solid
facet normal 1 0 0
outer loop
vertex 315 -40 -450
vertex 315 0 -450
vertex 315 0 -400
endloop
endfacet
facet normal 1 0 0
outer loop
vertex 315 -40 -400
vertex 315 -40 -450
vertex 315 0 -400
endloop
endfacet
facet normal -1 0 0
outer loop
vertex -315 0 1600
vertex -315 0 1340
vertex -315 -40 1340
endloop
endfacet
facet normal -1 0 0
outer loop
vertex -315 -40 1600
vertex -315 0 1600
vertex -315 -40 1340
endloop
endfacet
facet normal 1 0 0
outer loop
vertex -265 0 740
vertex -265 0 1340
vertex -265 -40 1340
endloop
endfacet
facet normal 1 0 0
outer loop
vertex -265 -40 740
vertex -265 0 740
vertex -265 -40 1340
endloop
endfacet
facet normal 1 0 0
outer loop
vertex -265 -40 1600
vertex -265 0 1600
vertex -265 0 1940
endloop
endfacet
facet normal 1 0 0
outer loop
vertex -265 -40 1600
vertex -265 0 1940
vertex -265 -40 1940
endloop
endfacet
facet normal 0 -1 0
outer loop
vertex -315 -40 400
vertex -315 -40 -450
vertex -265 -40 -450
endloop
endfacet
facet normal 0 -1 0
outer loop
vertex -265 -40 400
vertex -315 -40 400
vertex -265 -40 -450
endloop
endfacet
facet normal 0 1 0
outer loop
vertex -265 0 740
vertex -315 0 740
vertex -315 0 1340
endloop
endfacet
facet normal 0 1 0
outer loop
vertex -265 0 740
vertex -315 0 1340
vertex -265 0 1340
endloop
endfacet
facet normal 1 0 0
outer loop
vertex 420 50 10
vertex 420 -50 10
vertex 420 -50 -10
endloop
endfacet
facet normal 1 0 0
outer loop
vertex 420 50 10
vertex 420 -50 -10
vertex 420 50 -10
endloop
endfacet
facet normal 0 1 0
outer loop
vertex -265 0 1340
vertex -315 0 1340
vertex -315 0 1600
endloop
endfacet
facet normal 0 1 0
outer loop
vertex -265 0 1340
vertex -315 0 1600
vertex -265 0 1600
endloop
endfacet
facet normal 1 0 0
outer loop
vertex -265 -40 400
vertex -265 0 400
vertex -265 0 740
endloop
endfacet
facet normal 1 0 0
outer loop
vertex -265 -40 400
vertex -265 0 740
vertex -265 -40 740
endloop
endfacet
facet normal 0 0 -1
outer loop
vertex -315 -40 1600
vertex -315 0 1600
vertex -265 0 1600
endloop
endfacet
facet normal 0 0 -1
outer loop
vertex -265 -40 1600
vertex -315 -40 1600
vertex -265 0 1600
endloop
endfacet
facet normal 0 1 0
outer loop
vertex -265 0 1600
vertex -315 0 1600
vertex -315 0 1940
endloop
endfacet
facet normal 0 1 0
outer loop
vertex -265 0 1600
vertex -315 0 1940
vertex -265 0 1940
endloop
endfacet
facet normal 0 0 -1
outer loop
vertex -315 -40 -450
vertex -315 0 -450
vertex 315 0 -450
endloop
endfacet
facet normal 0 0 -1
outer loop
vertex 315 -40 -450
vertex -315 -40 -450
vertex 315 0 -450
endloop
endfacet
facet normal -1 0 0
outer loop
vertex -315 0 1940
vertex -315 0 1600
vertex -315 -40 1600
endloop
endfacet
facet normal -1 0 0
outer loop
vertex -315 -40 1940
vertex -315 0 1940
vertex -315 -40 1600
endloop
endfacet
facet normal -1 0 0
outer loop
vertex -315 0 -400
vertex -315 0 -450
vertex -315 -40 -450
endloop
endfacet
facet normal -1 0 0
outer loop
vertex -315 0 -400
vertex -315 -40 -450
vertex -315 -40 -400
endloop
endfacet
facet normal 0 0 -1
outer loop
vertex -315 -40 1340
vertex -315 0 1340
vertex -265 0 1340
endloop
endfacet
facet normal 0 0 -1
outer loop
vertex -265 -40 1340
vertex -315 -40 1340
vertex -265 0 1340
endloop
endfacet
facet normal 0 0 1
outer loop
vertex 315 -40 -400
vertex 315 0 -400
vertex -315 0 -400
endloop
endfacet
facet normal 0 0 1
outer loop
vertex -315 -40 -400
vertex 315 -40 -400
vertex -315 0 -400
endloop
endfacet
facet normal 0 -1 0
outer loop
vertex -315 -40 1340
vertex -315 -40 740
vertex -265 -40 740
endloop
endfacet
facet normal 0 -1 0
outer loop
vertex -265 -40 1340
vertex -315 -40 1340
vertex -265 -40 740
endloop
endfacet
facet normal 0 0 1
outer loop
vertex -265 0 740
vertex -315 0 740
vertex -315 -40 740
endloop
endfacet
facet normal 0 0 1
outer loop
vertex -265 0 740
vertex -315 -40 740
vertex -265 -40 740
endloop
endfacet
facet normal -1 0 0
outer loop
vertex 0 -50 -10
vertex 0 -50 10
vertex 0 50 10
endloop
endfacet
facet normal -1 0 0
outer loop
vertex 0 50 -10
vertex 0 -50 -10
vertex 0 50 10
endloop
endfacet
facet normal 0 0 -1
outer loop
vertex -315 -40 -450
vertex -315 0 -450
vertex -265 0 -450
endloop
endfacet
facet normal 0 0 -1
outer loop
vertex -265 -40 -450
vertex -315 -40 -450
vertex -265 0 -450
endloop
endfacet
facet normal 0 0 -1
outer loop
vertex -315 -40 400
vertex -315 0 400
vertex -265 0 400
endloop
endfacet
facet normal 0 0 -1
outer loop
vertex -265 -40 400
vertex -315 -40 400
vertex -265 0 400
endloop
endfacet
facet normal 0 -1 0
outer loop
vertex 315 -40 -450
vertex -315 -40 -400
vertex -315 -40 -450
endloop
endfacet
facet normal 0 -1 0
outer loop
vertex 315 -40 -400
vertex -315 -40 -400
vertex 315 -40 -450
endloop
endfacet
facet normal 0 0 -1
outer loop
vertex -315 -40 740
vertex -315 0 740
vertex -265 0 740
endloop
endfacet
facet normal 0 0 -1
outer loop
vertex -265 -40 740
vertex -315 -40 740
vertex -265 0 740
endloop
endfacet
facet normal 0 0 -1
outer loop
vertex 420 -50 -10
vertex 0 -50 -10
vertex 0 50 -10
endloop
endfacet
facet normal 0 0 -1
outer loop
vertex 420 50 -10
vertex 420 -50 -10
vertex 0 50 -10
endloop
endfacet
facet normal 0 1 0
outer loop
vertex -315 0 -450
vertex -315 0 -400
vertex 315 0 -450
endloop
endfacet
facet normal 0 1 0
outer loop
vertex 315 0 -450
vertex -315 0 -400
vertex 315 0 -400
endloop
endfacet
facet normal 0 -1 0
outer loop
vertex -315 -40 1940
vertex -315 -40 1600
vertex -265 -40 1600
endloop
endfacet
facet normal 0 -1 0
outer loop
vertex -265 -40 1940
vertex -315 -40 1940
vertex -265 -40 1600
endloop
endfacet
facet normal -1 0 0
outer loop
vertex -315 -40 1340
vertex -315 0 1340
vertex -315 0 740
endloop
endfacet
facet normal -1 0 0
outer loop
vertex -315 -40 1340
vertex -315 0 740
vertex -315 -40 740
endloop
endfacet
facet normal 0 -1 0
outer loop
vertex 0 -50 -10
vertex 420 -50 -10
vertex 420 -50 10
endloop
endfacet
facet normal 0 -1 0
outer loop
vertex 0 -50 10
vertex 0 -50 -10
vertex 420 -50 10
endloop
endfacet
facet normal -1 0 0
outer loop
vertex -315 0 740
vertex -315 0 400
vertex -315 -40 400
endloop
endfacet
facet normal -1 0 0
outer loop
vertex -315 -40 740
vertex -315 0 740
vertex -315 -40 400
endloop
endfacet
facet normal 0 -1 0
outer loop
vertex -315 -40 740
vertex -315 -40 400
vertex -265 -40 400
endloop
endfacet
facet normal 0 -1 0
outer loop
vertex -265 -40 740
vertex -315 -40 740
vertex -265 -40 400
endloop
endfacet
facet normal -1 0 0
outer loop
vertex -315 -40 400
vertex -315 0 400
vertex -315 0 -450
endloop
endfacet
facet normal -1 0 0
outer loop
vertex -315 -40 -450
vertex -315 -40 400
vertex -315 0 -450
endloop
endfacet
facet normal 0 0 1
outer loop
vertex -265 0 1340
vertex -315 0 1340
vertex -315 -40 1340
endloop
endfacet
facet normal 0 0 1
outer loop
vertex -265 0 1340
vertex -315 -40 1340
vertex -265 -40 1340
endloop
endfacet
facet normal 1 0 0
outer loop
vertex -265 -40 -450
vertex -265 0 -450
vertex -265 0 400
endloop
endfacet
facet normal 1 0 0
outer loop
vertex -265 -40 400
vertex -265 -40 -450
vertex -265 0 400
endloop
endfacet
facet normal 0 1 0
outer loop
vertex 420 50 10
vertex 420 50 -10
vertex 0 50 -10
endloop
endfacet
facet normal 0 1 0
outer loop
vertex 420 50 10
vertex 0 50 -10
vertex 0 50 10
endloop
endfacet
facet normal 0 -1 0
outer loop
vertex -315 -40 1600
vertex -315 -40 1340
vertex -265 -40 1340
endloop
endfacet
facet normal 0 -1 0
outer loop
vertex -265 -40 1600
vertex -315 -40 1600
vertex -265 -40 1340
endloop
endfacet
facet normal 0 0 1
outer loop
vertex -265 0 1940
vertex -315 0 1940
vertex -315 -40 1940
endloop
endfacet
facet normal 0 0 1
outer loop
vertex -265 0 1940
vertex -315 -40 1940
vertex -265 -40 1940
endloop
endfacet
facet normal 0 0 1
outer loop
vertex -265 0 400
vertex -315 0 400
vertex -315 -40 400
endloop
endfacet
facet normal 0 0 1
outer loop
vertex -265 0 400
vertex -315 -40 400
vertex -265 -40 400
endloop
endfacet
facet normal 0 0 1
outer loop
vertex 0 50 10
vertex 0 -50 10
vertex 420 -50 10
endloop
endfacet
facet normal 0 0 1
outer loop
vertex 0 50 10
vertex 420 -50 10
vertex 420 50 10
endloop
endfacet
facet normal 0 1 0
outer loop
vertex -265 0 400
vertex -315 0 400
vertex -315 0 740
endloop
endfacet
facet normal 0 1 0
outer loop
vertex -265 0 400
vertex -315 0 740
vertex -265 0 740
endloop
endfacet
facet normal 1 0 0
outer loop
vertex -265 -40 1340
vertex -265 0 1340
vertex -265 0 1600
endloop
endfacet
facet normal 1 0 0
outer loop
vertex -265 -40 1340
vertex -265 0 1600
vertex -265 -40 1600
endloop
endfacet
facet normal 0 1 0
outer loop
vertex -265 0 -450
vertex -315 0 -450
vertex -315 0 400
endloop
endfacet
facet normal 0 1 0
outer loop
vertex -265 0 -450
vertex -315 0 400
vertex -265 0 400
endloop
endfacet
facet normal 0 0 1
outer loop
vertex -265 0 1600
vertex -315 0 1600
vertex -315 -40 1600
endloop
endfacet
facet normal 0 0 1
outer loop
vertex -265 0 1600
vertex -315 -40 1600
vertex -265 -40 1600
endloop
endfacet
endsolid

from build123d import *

# Parameters (mm, degrees)
F0_W     = 50
F0_H     = 800
F0_H_2   = 50
F1_DEPTH = 40
F2_DEPTH = 40
F3_DEPTH = 340
F4_DEPTH = 600
F5_DEPTH = 260
F6_DEPTH = 340
F7_W     = 100
F7_H     = 20
F8_DEPTH = 420


with BuildPart() as f1:
    # F0 (on Front) → F1 (new body)
    with BuildSketch(Plane.XZ):
        with Locations((-290, 0)):
            Rectangle(F0_W, F0_H)
        with Locations((-290, -425)):
            Rectangle(F0_W, F0_H_2)
    extrude(amount=F1_DEPTH)


with BuildPart() as f2:
    # F0 (on Front) → F2 (new body)
    with BuildSketch(Plane.XZ):
        Polygon((315, -400), (265, -400), (-265, -400), (-265, -450), (315, -450), align=None)
        with Locations((-290, -425)):
            Rectangle(F0_W, F0_H_2)
    extrude(amount=F2_DEPTH)


with BuildPart() as f3:
    # F3 (new): a face of the model
    f3_faces = [f1.part.faces().sort_by_distance(p)[0] for p in [
        (-290, -20, 400),
    ]]
    extrude(f3_faces, amount=F3_DEPTH)


with BuildPart() as f4:
    # F4 (new): a face of the model
    f4_faces = [f3.part.faces().sort_by_distance(p)[0] for p in [
        (-290, -20, 740),
    ]]
    extrude(f4_faces, amount=F4_DEPTH)


with BuildPart() as f5:
    # F5 (new): a face of the model
    f5_faces = [f4.part.faces().sort_by_distance(p)[0] for p in [
        (-290, -20, 1340),
    ]]
    extrude(f5_faces, amount=F5_DEPTH)


with BuildPart() as f6:
    # F6 (new): a face of the model
    f6_faces = [f5.part.faces().sort_by_distance(p)[0] for p in [
        (-290, -20, 1600),
    ]]
    extrude(f6_faces, amount=F6_DEPTH)


with BuildPart() as f8:
    # F7 (on Right) → F8 (new body)
    with BuildSketch(Plane.YZ):
        Rectangle(F7_W, F7_H)
    extrude(amount=F8_DEPTH)


solid = Compound([f1.part, f2.part, f3.part, f4.part, f5.part, f6.part, f8.part])
